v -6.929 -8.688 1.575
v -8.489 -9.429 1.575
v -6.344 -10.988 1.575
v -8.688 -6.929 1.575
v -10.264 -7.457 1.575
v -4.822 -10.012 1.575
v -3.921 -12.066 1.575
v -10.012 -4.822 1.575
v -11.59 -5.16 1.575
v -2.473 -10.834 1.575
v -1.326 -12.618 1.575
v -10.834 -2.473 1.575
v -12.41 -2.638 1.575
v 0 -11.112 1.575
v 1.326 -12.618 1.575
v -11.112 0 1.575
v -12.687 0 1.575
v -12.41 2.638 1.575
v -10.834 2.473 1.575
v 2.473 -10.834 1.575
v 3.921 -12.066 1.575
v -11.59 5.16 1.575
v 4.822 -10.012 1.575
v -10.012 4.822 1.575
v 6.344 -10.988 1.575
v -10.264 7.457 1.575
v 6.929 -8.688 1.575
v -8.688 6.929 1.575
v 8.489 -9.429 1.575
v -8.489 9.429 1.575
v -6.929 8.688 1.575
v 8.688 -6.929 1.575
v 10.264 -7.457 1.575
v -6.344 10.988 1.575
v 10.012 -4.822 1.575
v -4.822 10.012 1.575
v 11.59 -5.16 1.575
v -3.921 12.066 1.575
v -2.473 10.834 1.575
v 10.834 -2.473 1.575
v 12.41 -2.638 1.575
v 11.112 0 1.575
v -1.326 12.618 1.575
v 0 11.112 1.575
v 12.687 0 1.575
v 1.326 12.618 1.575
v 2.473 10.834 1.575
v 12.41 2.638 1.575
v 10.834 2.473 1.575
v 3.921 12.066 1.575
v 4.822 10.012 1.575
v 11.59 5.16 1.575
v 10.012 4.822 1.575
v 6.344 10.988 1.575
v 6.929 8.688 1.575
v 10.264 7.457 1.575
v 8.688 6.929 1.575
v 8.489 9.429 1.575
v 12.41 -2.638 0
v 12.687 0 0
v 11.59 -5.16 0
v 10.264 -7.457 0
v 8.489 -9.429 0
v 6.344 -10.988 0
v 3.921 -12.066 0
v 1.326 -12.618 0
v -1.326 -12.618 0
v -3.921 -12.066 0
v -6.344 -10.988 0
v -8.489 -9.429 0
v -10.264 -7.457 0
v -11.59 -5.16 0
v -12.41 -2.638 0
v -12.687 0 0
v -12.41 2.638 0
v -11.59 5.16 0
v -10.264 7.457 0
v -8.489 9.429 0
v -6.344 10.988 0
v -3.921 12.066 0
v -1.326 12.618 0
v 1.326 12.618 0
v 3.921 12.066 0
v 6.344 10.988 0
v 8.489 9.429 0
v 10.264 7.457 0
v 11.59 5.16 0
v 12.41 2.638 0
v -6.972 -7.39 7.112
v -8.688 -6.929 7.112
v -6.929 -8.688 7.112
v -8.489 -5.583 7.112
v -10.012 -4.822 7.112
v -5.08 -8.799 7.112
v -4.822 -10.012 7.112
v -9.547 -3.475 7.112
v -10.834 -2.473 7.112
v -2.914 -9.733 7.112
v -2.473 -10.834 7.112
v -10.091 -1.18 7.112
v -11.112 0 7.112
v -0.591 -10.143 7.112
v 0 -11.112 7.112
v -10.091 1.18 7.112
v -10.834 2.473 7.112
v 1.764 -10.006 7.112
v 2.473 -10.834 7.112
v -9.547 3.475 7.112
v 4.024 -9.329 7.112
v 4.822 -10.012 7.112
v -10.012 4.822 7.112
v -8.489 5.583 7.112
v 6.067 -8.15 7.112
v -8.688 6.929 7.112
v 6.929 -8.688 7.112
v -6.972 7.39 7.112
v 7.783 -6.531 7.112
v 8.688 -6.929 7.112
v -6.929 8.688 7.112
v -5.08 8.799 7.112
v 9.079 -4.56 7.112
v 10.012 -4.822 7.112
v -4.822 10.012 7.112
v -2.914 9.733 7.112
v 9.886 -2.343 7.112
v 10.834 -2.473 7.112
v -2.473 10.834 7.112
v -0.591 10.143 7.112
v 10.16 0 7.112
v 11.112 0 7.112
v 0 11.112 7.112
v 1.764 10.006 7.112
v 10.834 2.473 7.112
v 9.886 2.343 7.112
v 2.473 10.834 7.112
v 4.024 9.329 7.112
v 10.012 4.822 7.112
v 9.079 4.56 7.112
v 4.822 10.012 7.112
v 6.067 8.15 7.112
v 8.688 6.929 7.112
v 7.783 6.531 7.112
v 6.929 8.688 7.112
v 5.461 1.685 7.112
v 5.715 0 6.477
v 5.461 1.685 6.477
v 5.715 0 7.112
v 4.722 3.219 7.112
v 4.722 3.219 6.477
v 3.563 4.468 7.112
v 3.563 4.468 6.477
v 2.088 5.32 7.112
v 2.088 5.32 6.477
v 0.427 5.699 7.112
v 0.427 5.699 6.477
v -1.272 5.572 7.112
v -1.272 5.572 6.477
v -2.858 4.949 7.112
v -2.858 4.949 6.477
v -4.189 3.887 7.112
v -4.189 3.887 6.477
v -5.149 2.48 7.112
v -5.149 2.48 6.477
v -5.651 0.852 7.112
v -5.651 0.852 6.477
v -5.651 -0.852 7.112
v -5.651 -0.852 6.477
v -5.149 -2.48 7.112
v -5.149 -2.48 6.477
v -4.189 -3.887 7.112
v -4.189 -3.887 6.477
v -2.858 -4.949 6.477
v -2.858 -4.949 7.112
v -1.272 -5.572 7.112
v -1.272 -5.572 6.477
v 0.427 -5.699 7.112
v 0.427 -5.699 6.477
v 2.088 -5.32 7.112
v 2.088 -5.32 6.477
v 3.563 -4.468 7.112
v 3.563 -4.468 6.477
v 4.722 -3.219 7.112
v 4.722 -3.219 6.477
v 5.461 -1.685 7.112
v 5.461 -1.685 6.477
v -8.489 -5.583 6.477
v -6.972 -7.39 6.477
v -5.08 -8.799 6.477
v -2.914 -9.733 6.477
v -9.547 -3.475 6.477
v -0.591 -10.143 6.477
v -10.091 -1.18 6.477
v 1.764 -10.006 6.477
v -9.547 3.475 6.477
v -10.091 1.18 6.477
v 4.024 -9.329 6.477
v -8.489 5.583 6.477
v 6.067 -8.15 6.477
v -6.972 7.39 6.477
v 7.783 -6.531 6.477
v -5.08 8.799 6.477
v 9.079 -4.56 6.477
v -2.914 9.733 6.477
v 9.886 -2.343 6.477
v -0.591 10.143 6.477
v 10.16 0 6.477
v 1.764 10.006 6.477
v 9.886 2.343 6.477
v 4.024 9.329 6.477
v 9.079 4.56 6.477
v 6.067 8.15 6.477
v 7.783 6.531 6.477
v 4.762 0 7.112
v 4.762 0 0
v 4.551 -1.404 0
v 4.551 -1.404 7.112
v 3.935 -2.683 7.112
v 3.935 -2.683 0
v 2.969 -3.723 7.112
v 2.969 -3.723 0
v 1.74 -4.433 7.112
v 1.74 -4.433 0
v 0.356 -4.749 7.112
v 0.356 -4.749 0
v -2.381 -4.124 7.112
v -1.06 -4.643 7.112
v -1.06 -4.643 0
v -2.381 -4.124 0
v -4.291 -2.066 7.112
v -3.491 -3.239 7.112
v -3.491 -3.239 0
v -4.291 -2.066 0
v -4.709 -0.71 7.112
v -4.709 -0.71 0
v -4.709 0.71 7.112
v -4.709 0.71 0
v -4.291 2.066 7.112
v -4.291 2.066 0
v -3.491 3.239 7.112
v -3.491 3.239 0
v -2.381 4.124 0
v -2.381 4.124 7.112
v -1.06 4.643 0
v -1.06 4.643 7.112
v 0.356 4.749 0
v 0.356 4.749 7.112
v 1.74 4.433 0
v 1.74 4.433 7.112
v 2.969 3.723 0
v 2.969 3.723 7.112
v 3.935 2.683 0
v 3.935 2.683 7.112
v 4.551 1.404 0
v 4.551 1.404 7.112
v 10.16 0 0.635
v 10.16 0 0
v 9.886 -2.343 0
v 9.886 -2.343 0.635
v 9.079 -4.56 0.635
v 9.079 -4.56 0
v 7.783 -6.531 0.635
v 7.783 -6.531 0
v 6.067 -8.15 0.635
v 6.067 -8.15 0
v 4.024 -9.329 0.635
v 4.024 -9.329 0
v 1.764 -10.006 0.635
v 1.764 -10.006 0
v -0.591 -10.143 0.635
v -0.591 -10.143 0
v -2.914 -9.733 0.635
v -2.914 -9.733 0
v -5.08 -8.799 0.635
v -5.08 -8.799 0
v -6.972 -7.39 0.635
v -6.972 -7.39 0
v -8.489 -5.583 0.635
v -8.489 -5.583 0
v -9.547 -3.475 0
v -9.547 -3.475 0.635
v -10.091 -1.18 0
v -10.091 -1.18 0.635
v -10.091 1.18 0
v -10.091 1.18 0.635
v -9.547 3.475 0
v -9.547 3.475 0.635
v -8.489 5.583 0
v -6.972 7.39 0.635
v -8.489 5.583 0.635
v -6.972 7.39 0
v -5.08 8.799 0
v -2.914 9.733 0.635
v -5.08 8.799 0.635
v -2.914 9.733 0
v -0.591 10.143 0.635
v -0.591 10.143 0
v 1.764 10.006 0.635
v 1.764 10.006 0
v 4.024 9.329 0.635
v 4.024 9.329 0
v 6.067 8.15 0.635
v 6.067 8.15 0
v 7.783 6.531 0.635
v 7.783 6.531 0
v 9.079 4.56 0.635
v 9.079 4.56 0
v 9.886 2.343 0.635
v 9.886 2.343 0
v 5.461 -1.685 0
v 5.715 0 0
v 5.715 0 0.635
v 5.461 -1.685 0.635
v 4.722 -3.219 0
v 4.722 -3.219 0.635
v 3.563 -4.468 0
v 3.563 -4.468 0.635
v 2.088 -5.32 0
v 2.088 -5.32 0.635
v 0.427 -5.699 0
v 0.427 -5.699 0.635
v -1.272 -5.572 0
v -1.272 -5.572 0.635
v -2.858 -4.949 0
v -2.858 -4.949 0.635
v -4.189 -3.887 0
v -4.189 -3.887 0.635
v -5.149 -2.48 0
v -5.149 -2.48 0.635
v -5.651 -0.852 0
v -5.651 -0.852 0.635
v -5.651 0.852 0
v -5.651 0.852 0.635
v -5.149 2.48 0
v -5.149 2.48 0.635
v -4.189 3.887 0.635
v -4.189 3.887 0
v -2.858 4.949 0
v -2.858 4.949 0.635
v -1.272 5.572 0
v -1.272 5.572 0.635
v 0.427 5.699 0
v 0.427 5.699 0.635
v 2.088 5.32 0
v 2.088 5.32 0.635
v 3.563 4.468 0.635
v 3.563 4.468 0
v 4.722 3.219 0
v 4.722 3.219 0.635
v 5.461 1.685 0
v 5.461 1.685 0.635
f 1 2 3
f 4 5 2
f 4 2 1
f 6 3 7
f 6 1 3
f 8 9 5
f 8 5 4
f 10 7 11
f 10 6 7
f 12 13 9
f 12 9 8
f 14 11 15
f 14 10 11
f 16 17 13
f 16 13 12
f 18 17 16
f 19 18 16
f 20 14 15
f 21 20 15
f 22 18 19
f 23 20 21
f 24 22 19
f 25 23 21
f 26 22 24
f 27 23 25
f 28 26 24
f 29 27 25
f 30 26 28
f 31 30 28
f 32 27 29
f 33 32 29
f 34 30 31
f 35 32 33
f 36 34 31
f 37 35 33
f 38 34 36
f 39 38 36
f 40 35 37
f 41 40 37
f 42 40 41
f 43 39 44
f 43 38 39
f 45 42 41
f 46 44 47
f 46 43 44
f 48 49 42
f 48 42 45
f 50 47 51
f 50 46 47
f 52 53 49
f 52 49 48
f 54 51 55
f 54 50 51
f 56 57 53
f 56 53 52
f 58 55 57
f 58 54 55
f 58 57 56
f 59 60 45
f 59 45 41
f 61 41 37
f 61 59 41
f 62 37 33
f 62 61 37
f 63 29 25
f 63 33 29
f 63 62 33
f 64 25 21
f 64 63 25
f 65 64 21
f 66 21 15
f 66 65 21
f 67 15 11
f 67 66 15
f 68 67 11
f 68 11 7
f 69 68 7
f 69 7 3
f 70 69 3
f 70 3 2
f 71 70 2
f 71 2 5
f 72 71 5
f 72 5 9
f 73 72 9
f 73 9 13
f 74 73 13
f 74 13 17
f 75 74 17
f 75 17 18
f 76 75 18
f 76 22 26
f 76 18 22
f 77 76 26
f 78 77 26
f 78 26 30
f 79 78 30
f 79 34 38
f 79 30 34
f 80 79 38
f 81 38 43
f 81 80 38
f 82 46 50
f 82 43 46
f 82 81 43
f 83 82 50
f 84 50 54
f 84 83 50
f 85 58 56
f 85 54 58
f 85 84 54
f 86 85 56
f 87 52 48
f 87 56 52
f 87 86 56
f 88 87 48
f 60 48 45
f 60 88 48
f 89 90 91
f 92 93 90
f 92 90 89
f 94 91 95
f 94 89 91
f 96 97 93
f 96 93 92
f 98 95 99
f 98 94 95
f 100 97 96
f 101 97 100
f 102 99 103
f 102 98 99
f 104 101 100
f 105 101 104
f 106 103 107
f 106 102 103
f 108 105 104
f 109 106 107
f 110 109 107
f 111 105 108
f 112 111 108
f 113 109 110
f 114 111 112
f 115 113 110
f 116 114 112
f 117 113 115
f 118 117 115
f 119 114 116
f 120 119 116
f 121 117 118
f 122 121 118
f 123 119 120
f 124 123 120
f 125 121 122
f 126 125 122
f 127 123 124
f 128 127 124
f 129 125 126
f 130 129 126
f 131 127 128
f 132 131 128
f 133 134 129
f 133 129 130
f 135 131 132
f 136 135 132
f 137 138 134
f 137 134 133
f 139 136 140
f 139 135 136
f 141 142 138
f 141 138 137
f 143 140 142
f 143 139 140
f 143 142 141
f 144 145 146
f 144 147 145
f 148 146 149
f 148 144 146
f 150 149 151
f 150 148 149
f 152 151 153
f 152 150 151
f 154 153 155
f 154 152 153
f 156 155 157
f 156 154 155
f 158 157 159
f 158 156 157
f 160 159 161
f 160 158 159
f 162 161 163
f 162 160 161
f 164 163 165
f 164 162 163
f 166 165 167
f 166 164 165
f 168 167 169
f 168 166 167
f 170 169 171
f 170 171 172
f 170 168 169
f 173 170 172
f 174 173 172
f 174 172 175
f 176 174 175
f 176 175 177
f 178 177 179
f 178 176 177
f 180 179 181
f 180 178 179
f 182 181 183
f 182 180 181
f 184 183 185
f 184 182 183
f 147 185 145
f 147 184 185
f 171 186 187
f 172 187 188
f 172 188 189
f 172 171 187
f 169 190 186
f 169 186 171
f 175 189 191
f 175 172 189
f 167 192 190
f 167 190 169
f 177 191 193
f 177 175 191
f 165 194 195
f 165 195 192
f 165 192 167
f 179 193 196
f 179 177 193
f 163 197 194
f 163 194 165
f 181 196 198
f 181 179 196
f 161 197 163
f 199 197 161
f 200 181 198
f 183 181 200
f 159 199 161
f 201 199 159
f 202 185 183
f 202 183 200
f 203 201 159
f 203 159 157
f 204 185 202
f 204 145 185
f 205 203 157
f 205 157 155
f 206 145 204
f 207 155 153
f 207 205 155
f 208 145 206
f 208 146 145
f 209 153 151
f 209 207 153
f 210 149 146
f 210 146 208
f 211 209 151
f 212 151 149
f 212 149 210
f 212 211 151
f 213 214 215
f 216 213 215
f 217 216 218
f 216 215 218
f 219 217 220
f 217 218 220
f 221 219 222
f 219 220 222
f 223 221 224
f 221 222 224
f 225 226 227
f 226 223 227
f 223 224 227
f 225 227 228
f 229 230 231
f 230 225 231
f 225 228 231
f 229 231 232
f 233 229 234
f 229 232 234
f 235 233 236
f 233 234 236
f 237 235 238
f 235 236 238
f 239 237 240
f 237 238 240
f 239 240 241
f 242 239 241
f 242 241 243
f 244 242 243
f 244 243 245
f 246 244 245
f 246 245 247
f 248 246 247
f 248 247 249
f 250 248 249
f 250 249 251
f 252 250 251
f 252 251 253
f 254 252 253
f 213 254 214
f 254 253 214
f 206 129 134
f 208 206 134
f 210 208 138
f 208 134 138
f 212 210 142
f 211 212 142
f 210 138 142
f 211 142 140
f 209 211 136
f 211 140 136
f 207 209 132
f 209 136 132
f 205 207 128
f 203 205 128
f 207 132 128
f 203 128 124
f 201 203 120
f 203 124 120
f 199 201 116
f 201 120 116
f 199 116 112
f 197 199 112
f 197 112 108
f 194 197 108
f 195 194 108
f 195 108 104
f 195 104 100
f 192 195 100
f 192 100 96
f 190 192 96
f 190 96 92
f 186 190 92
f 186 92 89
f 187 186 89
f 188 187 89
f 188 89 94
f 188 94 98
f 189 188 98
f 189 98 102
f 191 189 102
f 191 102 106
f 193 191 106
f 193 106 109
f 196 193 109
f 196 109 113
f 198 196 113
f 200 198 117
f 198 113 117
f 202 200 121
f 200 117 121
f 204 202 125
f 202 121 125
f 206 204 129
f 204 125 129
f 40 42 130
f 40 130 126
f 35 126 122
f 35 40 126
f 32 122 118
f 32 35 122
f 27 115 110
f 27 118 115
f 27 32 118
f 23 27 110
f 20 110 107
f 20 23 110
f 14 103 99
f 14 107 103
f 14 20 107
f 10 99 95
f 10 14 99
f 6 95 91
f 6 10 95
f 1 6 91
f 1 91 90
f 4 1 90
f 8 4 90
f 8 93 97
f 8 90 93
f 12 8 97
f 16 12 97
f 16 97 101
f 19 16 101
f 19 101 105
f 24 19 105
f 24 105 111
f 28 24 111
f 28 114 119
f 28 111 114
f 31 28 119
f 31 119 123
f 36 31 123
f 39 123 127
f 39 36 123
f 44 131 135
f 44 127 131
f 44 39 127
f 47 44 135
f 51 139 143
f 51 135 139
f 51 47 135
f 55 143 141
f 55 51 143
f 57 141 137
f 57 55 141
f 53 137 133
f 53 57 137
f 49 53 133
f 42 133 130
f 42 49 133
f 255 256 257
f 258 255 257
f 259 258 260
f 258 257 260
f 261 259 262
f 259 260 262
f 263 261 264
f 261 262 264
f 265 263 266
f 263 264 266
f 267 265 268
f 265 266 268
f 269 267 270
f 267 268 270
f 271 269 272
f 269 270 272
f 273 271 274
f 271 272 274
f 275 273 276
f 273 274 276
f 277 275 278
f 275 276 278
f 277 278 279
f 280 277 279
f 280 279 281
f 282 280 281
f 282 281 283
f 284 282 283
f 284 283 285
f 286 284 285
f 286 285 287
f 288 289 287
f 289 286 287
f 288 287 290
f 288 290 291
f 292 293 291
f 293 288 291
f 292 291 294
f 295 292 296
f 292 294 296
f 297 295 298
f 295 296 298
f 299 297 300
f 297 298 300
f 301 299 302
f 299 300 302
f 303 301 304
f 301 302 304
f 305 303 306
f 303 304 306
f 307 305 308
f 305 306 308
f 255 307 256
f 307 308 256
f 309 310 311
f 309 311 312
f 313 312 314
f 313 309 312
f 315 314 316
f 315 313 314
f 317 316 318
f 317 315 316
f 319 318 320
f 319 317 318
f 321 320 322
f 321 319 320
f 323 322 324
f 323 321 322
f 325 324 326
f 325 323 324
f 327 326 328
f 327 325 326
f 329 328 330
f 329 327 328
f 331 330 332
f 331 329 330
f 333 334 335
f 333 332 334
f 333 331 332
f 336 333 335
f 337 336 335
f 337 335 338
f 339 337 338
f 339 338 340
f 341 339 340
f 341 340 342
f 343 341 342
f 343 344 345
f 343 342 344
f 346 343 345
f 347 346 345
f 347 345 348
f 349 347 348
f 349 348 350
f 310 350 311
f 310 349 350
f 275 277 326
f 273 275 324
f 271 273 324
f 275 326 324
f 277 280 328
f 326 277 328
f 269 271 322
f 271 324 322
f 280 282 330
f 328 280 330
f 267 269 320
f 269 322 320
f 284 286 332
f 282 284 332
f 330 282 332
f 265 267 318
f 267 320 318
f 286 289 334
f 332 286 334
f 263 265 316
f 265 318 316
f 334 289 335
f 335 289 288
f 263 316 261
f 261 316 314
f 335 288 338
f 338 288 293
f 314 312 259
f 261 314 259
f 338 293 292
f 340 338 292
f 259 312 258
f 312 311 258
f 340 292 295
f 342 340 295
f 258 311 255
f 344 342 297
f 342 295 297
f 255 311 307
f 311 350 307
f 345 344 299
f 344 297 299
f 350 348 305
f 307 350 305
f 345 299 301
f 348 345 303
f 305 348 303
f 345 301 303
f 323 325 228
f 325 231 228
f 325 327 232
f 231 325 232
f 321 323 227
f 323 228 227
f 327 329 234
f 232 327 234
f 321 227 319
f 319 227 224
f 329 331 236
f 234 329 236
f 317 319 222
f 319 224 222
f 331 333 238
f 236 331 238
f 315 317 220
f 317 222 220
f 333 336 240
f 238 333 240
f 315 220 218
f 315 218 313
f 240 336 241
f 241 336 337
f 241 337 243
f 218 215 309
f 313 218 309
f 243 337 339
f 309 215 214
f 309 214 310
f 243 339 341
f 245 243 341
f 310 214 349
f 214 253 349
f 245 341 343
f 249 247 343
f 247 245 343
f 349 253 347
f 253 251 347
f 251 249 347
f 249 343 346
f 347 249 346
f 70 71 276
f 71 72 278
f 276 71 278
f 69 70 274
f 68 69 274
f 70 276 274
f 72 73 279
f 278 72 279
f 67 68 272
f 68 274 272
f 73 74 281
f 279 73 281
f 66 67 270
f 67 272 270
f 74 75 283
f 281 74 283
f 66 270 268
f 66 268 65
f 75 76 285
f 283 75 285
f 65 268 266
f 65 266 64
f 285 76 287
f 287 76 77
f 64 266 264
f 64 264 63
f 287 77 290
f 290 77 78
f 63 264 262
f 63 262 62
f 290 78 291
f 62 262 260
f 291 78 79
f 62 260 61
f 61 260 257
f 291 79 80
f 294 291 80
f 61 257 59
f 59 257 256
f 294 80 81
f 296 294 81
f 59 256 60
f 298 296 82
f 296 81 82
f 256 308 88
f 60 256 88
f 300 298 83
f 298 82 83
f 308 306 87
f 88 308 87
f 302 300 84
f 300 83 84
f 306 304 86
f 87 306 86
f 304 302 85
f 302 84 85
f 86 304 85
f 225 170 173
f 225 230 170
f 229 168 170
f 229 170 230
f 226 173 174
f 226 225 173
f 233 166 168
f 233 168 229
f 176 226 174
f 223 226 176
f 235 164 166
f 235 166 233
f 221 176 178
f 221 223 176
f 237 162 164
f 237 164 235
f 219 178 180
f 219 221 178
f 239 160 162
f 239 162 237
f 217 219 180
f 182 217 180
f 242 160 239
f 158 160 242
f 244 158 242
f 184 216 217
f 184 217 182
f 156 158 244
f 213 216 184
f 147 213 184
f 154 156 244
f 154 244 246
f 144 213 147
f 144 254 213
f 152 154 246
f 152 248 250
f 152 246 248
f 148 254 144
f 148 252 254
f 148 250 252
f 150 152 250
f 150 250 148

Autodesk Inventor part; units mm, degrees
ref_plane "YZ Plane" through (0, 0, 0) normal (1, 0, 0) x (0, 1, 0)
ref_plane "XZ Plane" through (0, 0, 0) normal (0, 1, 0) x (-1, 0, 0)
ref_plane "XY Plane" through (0, 0, 0) normal (0, 0, 1) x (1, 0, 0)
sketch "Sketch1" plane through (0, 0, 0) normal (0, 0, 1) x (1, 0, 0)
  circle A0 centre (0, 0) radius 4.7625
  circle A1 centre (0, 0) radius 11.1125
  circle A2 centre (0, 0) radius 12.6873
  circle A3 centre (0, 0) radius 5.715
  circle A4 centre (0, 0) radius 10.16
  dimension "d0" = 9.525
  dimension "d1" = 22.225
  dimension "d2" = 25.3746
  dimension "d7" = 20.32
  dimension "d8" = 11.43
extrude "Extrusion1" add sketch "Sketch1" along normal blind 7.112 contours A1 | A3 | A4
extrude "Extrusion2" add sketch "Sketch1" along normal blind 1.5748 contours A2
extrude "Extrusion3" cut sketch "Sketch1" along normal blind 0.635 contours A4
sketch "Sketch2" plane through (0, 0, 7.112) normal (0, 0, 1) x (1, 0, 0)
  circle A0 centre (0, 0) radius 5.715 projected
  circle A1 centre (0, 0) radius 10.16 projected
extrude "Extrusion4" cut sketch "Sketch2" against normal blind 0.635
properties part number ".375 ID .875 OD bearing"
